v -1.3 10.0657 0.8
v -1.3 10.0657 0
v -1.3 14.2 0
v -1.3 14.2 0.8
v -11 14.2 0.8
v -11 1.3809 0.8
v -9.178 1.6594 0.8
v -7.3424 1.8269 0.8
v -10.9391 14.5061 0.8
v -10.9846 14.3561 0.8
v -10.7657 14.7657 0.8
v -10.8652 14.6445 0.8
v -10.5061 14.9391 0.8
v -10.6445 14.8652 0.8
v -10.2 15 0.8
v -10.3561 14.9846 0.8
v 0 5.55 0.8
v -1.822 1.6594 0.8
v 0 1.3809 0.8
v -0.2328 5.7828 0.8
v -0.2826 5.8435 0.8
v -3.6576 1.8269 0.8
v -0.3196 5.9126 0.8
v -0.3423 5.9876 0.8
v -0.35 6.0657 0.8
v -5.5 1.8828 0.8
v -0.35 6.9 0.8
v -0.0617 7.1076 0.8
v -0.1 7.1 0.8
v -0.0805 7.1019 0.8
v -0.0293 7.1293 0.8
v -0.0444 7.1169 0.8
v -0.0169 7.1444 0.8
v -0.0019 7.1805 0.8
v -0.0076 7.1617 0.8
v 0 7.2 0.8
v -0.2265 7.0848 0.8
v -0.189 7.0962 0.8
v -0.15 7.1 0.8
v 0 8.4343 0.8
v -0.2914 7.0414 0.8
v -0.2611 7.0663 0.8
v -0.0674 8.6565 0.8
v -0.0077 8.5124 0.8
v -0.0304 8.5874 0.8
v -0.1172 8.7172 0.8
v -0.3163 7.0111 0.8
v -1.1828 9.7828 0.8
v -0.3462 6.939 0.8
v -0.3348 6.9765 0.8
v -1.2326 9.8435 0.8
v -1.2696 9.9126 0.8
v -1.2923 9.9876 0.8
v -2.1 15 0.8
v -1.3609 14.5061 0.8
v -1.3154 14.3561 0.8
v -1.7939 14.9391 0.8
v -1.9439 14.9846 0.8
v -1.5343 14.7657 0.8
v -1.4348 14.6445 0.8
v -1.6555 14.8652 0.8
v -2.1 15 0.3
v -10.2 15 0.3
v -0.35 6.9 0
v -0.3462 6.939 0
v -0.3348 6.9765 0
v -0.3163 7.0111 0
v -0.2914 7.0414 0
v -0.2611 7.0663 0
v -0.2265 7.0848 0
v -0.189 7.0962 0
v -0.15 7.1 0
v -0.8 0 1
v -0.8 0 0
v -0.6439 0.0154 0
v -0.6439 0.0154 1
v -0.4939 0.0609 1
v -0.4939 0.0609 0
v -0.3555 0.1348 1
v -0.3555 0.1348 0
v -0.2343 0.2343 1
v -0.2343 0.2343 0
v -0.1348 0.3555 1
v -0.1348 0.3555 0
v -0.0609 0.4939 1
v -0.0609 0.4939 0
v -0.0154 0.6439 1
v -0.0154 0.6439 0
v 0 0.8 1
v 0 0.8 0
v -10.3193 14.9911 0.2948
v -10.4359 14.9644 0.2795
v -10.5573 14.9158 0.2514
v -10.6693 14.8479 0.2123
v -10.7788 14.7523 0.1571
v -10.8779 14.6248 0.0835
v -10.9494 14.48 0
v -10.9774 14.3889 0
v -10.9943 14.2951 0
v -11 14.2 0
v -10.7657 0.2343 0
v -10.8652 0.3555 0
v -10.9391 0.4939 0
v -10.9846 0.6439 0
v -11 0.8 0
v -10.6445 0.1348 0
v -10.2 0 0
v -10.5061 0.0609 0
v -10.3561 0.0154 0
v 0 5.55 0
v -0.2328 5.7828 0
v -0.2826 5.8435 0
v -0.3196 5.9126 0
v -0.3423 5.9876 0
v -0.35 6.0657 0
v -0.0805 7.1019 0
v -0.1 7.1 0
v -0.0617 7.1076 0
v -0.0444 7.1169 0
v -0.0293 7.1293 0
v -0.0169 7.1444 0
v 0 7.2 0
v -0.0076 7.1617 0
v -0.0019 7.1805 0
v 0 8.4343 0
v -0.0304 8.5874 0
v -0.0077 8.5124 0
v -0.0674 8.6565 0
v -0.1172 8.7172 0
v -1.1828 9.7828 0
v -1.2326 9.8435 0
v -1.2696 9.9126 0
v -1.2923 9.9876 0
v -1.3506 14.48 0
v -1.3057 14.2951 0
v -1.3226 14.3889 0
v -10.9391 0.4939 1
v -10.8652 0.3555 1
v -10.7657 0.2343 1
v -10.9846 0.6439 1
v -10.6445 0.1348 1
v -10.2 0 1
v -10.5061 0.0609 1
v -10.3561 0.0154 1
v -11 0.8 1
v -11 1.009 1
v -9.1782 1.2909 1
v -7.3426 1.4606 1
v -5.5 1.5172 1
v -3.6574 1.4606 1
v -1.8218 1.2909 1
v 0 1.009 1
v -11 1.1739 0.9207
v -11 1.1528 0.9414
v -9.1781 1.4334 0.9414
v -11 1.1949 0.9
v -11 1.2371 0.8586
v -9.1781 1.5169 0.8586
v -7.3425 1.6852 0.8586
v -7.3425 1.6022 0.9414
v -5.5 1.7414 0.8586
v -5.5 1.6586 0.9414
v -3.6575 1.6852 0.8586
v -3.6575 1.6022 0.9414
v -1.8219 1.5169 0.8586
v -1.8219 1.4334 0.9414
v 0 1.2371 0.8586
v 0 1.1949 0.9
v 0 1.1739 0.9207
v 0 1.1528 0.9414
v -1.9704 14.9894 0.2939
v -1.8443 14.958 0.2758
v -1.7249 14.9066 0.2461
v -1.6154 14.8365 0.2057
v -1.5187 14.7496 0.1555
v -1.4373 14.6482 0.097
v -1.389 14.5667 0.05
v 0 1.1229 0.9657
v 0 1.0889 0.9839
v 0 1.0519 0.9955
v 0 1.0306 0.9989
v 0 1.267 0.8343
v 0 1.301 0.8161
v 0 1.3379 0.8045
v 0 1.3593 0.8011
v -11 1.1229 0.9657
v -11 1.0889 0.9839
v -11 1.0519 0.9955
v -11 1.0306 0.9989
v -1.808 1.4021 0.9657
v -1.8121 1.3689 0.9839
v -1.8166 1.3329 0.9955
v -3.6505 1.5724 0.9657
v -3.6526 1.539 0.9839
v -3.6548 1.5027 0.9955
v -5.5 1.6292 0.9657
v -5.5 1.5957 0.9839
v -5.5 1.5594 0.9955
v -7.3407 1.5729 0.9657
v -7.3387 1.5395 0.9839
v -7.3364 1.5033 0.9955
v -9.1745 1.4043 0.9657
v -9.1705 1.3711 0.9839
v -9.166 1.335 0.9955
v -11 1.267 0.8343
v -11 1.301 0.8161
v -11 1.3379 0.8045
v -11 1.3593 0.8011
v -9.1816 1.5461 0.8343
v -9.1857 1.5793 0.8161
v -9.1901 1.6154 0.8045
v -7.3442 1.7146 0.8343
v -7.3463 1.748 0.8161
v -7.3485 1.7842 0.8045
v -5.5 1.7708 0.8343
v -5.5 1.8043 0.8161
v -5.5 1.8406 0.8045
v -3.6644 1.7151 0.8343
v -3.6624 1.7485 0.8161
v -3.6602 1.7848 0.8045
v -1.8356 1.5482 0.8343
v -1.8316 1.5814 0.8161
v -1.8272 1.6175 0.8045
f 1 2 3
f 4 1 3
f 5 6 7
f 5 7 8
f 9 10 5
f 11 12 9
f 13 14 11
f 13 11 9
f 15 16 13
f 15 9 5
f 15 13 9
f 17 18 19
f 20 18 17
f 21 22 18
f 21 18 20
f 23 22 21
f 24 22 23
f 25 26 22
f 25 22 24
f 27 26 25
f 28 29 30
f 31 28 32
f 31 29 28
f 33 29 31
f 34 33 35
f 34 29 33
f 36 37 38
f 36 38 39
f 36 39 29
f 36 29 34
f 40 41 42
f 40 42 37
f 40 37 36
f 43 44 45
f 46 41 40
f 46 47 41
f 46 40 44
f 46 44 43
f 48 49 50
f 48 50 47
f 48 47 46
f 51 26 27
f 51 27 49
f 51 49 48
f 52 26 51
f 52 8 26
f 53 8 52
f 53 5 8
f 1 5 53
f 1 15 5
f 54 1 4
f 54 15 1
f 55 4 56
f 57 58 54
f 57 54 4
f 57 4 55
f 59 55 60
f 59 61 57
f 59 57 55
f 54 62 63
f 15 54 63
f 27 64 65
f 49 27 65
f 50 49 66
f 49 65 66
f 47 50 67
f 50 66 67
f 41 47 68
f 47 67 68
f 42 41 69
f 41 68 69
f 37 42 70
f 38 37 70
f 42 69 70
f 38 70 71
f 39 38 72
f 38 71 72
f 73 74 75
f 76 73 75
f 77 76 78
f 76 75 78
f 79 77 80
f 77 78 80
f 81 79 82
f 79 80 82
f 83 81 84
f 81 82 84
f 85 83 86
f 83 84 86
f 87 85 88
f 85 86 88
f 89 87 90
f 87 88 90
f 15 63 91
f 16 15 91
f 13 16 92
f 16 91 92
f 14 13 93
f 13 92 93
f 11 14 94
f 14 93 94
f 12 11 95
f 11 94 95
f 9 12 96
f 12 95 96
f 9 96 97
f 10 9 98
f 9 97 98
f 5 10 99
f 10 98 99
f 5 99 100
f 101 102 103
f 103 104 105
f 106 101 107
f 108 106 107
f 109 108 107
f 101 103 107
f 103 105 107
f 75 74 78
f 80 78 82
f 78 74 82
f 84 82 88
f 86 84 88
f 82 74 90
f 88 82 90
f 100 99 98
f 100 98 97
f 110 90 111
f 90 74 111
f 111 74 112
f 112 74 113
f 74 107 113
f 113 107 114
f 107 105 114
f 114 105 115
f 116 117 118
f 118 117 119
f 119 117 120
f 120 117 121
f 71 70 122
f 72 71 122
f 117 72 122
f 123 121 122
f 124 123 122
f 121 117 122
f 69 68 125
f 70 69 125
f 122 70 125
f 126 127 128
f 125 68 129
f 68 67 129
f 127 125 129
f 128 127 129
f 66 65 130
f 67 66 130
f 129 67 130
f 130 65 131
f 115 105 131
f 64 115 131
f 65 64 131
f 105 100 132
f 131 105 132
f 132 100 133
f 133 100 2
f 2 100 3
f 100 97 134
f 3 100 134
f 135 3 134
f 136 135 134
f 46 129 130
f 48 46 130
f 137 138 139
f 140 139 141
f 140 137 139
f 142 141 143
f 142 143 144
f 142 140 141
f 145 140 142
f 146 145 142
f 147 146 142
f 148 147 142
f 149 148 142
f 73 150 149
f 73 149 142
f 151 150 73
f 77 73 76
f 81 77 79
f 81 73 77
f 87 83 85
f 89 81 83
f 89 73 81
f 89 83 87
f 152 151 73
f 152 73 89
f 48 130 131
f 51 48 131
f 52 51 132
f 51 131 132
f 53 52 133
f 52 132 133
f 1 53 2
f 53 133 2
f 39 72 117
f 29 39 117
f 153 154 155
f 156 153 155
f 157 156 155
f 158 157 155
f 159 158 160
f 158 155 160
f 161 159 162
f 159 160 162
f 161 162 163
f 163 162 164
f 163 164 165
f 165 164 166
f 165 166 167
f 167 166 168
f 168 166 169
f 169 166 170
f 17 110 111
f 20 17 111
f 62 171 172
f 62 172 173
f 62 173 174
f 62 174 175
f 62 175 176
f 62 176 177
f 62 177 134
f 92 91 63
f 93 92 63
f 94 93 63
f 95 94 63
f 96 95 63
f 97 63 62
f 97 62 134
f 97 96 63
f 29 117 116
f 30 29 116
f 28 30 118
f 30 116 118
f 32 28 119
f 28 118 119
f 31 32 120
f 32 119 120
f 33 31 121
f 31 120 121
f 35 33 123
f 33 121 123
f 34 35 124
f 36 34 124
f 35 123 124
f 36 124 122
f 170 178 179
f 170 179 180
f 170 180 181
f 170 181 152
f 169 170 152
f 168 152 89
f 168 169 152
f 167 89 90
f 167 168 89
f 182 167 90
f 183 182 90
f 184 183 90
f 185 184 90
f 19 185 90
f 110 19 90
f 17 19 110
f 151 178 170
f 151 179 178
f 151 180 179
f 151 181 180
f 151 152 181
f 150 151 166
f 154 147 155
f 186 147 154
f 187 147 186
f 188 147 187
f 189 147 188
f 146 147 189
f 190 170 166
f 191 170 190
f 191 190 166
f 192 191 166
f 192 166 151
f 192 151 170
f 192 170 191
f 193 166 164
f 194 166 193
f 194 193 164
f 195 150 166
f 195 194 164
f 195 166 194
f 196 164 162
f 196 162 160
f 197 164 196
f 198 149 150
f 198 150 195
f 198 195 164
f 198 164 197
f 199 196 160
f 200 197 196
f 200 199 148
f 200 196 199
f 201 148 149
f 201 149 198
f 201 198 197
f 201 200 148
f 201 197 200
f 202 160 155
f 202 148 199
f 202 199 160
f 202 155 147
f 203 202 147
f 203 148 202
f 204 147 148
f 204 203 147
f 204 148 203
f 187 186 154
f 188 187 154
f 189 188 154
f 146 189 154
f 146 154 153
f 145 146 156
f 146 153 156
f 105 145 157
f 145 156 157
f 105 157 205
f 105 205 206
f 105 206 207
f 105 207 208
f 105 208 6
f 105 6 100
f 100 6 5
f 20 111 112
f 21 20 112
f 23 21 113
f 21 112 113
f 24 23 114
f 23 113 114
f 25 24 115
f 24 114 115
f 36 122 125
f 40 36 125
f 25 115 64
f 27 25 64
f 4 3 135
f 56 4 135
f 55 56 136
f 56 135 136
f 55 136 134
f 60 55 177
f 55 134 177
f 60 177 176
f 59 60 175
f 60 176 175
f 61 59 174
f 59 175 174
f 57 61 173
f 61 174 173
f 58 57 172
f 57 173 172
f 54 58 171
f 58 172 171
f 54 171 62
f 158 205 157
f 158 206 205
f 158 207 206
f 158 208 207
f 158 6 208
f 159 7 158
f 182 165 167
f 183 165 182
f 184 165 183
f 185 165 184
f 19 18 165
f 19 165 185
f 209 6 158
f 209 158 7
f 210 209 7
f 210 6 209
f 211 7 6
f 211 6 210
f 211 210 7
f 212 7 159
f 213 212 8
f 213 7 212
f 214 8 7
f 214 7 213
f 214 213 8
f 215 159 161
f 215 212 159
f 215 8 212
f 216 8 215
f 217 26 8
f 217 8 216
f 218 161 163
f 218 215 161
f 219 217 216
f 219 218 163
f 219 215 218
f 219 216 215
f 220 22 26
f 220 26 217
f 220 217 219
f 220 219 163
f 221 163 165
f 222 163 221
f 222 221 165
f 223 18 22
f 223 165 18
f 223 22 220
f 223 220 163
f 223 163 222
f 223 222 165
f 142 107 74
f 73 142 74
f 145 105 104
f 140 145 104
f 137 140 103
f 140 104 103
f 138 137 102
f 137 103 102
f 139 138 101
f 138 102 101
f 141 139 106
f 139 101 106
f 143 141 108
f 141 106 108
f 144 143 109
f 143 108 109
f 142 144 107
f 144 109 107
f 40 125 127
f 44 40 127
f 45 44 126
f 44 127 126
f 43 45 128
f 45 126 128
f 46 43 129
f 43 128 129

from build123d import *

# Parameters (mm, degrees)
F1_DEPTH    = 0.8
F2_DEPTH    = 1
F3_T4_ANGLE = 24.0749520294
F4_R        = 0.2
F5_T1_DEPTH = 10.790585283


# Not quite as in the source:
# - a fillet or chamfer that OpenCascade refuses, or shapes differently, is made with other operations: its cross-section is extruded or revolved along the edge and cut away or added


with BuildPart() as f1:
    # F0 (on Top) → F1 (new body)
    with BuildSketch(Plane.XY):
        with BuildLine():
            Line((-10.2, 0), (-0.8, 0))
            ThreePointArc((-0.8, 0), (-0.2343145751, 0.2343145751), (0, 0.8))
            Line((0, 0.8), (0, 0.9915242061))
            ThreePointArc((0, 0.9915242061), (-5.5, 1.5), (-11, 0.9915242061))
            Line((-11, 0.9915242061), (-11, 0.8))
            ThreePointArc((-11, 0.8), (-10.7656854249, 0.2343145751), (-10.2, 0))
        make_face()
        with BuildLine():
            ThreePointArc((-11, 0.9915242061), (-5.5, 1.5), (0, 0.9915242061))
            Line((0, 0.9915242061), (0, 1.3315242061))
            ThreePointArc((0, 1.3315242061), (-5.5, 1.84), (-11, 1.3315242061))
            Line((-11, 1.3315242061), (-11, 0.9915242061))
        make_face()
        with BuildLine():
            ThreePointArc((-11, 1.3315242061), (-5.5, 1.84), (0, 1.3315242061))
            Line((0, 1.3315242061), (0, 5.55))
            Line((0, 5.55), (-0.2328427125, 5.7828427125))
            ThreePointArc((-0.2328427125, 5.7828427125), (-0.319551813, 5.912612052), (-0.35, 6.0656854249))
            Line((-0.35, 6.0656854249), (-0.35, 6.9))
            ThreePointArc((-0.35, 6.9), (-0.2914213562, 7.0414213562), (-0.15, 7.1))
            Line((-0.15, 7.1), (-0.1, 7.1))
            ThreePointArc((-0.1, 7.1), (-0.0292893219, 7.1292893219), (0, 7.2))
            Line((0, 7.2), (0, 8.4343145751))
            ThreePointArc((0, 8.4343145751), (-0.030448187, 8.587387948), (-0.1171572875, 8.7171572875))
            Line((-0.1171572875, 8.7171572875), (-1.1828427125, 9.7828427125))
            ThreePointArc((-1.1828427125, 9.7828427125), (-1.269551813, 9.912612052), (-1.3, 10.0656854249))
            Line((-1.3, 10.0656854249), (-1.3, 14.2))
            ThreePointArc((-1.3, 14.2), (-1.5343145751, 14.7656854249), (-2.1, 15))
            Line((-2.1, 15), (-10.2, 15))
            ThreePointArc((-10.2, 15), (-10.7656854249, 14.7656854249), (-11, 14.2))
            Line((-11, 14.2), (-11, 1.3315242061))
        make_face()
    extrude(amount=F1_DEPTH)

    # F0 (on Top) → F2 (join)
    with BuildSketch(Plane.XY):
        with BuildLine():
            Line((-10.2, 0), (-0.8, 0))
            ThreePointArc((-0.8, 0), (-0.2343145751, 0.2343145751), (0, 0.8))
            Line((0, 0.8), (0, 0.9915242061))
            ThreePointArc((0, 0.9915242061), (-5.5, 1.5), (-11, 0.9915242061))
            Line((-11, 0.9915242061), (-11, 0.8))
            ThreePointArc((-11, 0.8), (-10.7656854249, 0.2343145751), (-10.2, 0))
        make_face()
    extrude(amount=F2_DEPTH)

    # F3: chamfer of 0.3 on 1 edges, made by hand


with BuildPart() as f3_tool2:
    # F3_s3 → F3_t4 (revolve)
    with BuildSketch(Plane(origin=(-11.0738065014, -2.3613816897, 0), x_dir=(0, 0, 1), z_dir=(-0.9780114007, -0.2085514329, 0))):
        Polygon((0.8, 3.5737079623), (1.1, 3.2737079623), (0.8, 3.2737079623), align=None)
    revolve(axis=Axis((-5.5, -28.5, 0.8), (0, 0, -1)), revolution_arc=F3_T4_ANGLE)

    split(bisect_by=Plane.YZ.offset(-11), keep=Keep.TOP)

    split(bisect_by=Plane.YZ, keep=Keep.BOTTOM)

    split(bisect_by=Plane.XY.offset(1), keep=Keep.BOTTOM)


with BuildPart() as f1_1:
    add(f1.part)

    # F3_t1: union F3_tool2
    add(f3_tool2.part)

    # F4
    f4_edges = [f1_1.edges().sort_by_distance(p)[0] for p in [
        (-5.5, 1.8, 0.8),
        (-5.5, 1.6, 1),
    ]]
    fillet(f4_edges, radius=F4_R)

    # F5: chamfer of 0.52 x 0.3 on 1 edges, made by hand

    # F5_s2 → F5_t1 (cut)
    with BuildSketch(Plane.YZ.offset(-11.5452926415)):
        Polygon((15, 0.3), (14.48, 0), (15, 0), align=None)
    extrude(amount=F5_T1_DEPTH, mode=Mode.SUBTRACT)


solid = f1_1.part
